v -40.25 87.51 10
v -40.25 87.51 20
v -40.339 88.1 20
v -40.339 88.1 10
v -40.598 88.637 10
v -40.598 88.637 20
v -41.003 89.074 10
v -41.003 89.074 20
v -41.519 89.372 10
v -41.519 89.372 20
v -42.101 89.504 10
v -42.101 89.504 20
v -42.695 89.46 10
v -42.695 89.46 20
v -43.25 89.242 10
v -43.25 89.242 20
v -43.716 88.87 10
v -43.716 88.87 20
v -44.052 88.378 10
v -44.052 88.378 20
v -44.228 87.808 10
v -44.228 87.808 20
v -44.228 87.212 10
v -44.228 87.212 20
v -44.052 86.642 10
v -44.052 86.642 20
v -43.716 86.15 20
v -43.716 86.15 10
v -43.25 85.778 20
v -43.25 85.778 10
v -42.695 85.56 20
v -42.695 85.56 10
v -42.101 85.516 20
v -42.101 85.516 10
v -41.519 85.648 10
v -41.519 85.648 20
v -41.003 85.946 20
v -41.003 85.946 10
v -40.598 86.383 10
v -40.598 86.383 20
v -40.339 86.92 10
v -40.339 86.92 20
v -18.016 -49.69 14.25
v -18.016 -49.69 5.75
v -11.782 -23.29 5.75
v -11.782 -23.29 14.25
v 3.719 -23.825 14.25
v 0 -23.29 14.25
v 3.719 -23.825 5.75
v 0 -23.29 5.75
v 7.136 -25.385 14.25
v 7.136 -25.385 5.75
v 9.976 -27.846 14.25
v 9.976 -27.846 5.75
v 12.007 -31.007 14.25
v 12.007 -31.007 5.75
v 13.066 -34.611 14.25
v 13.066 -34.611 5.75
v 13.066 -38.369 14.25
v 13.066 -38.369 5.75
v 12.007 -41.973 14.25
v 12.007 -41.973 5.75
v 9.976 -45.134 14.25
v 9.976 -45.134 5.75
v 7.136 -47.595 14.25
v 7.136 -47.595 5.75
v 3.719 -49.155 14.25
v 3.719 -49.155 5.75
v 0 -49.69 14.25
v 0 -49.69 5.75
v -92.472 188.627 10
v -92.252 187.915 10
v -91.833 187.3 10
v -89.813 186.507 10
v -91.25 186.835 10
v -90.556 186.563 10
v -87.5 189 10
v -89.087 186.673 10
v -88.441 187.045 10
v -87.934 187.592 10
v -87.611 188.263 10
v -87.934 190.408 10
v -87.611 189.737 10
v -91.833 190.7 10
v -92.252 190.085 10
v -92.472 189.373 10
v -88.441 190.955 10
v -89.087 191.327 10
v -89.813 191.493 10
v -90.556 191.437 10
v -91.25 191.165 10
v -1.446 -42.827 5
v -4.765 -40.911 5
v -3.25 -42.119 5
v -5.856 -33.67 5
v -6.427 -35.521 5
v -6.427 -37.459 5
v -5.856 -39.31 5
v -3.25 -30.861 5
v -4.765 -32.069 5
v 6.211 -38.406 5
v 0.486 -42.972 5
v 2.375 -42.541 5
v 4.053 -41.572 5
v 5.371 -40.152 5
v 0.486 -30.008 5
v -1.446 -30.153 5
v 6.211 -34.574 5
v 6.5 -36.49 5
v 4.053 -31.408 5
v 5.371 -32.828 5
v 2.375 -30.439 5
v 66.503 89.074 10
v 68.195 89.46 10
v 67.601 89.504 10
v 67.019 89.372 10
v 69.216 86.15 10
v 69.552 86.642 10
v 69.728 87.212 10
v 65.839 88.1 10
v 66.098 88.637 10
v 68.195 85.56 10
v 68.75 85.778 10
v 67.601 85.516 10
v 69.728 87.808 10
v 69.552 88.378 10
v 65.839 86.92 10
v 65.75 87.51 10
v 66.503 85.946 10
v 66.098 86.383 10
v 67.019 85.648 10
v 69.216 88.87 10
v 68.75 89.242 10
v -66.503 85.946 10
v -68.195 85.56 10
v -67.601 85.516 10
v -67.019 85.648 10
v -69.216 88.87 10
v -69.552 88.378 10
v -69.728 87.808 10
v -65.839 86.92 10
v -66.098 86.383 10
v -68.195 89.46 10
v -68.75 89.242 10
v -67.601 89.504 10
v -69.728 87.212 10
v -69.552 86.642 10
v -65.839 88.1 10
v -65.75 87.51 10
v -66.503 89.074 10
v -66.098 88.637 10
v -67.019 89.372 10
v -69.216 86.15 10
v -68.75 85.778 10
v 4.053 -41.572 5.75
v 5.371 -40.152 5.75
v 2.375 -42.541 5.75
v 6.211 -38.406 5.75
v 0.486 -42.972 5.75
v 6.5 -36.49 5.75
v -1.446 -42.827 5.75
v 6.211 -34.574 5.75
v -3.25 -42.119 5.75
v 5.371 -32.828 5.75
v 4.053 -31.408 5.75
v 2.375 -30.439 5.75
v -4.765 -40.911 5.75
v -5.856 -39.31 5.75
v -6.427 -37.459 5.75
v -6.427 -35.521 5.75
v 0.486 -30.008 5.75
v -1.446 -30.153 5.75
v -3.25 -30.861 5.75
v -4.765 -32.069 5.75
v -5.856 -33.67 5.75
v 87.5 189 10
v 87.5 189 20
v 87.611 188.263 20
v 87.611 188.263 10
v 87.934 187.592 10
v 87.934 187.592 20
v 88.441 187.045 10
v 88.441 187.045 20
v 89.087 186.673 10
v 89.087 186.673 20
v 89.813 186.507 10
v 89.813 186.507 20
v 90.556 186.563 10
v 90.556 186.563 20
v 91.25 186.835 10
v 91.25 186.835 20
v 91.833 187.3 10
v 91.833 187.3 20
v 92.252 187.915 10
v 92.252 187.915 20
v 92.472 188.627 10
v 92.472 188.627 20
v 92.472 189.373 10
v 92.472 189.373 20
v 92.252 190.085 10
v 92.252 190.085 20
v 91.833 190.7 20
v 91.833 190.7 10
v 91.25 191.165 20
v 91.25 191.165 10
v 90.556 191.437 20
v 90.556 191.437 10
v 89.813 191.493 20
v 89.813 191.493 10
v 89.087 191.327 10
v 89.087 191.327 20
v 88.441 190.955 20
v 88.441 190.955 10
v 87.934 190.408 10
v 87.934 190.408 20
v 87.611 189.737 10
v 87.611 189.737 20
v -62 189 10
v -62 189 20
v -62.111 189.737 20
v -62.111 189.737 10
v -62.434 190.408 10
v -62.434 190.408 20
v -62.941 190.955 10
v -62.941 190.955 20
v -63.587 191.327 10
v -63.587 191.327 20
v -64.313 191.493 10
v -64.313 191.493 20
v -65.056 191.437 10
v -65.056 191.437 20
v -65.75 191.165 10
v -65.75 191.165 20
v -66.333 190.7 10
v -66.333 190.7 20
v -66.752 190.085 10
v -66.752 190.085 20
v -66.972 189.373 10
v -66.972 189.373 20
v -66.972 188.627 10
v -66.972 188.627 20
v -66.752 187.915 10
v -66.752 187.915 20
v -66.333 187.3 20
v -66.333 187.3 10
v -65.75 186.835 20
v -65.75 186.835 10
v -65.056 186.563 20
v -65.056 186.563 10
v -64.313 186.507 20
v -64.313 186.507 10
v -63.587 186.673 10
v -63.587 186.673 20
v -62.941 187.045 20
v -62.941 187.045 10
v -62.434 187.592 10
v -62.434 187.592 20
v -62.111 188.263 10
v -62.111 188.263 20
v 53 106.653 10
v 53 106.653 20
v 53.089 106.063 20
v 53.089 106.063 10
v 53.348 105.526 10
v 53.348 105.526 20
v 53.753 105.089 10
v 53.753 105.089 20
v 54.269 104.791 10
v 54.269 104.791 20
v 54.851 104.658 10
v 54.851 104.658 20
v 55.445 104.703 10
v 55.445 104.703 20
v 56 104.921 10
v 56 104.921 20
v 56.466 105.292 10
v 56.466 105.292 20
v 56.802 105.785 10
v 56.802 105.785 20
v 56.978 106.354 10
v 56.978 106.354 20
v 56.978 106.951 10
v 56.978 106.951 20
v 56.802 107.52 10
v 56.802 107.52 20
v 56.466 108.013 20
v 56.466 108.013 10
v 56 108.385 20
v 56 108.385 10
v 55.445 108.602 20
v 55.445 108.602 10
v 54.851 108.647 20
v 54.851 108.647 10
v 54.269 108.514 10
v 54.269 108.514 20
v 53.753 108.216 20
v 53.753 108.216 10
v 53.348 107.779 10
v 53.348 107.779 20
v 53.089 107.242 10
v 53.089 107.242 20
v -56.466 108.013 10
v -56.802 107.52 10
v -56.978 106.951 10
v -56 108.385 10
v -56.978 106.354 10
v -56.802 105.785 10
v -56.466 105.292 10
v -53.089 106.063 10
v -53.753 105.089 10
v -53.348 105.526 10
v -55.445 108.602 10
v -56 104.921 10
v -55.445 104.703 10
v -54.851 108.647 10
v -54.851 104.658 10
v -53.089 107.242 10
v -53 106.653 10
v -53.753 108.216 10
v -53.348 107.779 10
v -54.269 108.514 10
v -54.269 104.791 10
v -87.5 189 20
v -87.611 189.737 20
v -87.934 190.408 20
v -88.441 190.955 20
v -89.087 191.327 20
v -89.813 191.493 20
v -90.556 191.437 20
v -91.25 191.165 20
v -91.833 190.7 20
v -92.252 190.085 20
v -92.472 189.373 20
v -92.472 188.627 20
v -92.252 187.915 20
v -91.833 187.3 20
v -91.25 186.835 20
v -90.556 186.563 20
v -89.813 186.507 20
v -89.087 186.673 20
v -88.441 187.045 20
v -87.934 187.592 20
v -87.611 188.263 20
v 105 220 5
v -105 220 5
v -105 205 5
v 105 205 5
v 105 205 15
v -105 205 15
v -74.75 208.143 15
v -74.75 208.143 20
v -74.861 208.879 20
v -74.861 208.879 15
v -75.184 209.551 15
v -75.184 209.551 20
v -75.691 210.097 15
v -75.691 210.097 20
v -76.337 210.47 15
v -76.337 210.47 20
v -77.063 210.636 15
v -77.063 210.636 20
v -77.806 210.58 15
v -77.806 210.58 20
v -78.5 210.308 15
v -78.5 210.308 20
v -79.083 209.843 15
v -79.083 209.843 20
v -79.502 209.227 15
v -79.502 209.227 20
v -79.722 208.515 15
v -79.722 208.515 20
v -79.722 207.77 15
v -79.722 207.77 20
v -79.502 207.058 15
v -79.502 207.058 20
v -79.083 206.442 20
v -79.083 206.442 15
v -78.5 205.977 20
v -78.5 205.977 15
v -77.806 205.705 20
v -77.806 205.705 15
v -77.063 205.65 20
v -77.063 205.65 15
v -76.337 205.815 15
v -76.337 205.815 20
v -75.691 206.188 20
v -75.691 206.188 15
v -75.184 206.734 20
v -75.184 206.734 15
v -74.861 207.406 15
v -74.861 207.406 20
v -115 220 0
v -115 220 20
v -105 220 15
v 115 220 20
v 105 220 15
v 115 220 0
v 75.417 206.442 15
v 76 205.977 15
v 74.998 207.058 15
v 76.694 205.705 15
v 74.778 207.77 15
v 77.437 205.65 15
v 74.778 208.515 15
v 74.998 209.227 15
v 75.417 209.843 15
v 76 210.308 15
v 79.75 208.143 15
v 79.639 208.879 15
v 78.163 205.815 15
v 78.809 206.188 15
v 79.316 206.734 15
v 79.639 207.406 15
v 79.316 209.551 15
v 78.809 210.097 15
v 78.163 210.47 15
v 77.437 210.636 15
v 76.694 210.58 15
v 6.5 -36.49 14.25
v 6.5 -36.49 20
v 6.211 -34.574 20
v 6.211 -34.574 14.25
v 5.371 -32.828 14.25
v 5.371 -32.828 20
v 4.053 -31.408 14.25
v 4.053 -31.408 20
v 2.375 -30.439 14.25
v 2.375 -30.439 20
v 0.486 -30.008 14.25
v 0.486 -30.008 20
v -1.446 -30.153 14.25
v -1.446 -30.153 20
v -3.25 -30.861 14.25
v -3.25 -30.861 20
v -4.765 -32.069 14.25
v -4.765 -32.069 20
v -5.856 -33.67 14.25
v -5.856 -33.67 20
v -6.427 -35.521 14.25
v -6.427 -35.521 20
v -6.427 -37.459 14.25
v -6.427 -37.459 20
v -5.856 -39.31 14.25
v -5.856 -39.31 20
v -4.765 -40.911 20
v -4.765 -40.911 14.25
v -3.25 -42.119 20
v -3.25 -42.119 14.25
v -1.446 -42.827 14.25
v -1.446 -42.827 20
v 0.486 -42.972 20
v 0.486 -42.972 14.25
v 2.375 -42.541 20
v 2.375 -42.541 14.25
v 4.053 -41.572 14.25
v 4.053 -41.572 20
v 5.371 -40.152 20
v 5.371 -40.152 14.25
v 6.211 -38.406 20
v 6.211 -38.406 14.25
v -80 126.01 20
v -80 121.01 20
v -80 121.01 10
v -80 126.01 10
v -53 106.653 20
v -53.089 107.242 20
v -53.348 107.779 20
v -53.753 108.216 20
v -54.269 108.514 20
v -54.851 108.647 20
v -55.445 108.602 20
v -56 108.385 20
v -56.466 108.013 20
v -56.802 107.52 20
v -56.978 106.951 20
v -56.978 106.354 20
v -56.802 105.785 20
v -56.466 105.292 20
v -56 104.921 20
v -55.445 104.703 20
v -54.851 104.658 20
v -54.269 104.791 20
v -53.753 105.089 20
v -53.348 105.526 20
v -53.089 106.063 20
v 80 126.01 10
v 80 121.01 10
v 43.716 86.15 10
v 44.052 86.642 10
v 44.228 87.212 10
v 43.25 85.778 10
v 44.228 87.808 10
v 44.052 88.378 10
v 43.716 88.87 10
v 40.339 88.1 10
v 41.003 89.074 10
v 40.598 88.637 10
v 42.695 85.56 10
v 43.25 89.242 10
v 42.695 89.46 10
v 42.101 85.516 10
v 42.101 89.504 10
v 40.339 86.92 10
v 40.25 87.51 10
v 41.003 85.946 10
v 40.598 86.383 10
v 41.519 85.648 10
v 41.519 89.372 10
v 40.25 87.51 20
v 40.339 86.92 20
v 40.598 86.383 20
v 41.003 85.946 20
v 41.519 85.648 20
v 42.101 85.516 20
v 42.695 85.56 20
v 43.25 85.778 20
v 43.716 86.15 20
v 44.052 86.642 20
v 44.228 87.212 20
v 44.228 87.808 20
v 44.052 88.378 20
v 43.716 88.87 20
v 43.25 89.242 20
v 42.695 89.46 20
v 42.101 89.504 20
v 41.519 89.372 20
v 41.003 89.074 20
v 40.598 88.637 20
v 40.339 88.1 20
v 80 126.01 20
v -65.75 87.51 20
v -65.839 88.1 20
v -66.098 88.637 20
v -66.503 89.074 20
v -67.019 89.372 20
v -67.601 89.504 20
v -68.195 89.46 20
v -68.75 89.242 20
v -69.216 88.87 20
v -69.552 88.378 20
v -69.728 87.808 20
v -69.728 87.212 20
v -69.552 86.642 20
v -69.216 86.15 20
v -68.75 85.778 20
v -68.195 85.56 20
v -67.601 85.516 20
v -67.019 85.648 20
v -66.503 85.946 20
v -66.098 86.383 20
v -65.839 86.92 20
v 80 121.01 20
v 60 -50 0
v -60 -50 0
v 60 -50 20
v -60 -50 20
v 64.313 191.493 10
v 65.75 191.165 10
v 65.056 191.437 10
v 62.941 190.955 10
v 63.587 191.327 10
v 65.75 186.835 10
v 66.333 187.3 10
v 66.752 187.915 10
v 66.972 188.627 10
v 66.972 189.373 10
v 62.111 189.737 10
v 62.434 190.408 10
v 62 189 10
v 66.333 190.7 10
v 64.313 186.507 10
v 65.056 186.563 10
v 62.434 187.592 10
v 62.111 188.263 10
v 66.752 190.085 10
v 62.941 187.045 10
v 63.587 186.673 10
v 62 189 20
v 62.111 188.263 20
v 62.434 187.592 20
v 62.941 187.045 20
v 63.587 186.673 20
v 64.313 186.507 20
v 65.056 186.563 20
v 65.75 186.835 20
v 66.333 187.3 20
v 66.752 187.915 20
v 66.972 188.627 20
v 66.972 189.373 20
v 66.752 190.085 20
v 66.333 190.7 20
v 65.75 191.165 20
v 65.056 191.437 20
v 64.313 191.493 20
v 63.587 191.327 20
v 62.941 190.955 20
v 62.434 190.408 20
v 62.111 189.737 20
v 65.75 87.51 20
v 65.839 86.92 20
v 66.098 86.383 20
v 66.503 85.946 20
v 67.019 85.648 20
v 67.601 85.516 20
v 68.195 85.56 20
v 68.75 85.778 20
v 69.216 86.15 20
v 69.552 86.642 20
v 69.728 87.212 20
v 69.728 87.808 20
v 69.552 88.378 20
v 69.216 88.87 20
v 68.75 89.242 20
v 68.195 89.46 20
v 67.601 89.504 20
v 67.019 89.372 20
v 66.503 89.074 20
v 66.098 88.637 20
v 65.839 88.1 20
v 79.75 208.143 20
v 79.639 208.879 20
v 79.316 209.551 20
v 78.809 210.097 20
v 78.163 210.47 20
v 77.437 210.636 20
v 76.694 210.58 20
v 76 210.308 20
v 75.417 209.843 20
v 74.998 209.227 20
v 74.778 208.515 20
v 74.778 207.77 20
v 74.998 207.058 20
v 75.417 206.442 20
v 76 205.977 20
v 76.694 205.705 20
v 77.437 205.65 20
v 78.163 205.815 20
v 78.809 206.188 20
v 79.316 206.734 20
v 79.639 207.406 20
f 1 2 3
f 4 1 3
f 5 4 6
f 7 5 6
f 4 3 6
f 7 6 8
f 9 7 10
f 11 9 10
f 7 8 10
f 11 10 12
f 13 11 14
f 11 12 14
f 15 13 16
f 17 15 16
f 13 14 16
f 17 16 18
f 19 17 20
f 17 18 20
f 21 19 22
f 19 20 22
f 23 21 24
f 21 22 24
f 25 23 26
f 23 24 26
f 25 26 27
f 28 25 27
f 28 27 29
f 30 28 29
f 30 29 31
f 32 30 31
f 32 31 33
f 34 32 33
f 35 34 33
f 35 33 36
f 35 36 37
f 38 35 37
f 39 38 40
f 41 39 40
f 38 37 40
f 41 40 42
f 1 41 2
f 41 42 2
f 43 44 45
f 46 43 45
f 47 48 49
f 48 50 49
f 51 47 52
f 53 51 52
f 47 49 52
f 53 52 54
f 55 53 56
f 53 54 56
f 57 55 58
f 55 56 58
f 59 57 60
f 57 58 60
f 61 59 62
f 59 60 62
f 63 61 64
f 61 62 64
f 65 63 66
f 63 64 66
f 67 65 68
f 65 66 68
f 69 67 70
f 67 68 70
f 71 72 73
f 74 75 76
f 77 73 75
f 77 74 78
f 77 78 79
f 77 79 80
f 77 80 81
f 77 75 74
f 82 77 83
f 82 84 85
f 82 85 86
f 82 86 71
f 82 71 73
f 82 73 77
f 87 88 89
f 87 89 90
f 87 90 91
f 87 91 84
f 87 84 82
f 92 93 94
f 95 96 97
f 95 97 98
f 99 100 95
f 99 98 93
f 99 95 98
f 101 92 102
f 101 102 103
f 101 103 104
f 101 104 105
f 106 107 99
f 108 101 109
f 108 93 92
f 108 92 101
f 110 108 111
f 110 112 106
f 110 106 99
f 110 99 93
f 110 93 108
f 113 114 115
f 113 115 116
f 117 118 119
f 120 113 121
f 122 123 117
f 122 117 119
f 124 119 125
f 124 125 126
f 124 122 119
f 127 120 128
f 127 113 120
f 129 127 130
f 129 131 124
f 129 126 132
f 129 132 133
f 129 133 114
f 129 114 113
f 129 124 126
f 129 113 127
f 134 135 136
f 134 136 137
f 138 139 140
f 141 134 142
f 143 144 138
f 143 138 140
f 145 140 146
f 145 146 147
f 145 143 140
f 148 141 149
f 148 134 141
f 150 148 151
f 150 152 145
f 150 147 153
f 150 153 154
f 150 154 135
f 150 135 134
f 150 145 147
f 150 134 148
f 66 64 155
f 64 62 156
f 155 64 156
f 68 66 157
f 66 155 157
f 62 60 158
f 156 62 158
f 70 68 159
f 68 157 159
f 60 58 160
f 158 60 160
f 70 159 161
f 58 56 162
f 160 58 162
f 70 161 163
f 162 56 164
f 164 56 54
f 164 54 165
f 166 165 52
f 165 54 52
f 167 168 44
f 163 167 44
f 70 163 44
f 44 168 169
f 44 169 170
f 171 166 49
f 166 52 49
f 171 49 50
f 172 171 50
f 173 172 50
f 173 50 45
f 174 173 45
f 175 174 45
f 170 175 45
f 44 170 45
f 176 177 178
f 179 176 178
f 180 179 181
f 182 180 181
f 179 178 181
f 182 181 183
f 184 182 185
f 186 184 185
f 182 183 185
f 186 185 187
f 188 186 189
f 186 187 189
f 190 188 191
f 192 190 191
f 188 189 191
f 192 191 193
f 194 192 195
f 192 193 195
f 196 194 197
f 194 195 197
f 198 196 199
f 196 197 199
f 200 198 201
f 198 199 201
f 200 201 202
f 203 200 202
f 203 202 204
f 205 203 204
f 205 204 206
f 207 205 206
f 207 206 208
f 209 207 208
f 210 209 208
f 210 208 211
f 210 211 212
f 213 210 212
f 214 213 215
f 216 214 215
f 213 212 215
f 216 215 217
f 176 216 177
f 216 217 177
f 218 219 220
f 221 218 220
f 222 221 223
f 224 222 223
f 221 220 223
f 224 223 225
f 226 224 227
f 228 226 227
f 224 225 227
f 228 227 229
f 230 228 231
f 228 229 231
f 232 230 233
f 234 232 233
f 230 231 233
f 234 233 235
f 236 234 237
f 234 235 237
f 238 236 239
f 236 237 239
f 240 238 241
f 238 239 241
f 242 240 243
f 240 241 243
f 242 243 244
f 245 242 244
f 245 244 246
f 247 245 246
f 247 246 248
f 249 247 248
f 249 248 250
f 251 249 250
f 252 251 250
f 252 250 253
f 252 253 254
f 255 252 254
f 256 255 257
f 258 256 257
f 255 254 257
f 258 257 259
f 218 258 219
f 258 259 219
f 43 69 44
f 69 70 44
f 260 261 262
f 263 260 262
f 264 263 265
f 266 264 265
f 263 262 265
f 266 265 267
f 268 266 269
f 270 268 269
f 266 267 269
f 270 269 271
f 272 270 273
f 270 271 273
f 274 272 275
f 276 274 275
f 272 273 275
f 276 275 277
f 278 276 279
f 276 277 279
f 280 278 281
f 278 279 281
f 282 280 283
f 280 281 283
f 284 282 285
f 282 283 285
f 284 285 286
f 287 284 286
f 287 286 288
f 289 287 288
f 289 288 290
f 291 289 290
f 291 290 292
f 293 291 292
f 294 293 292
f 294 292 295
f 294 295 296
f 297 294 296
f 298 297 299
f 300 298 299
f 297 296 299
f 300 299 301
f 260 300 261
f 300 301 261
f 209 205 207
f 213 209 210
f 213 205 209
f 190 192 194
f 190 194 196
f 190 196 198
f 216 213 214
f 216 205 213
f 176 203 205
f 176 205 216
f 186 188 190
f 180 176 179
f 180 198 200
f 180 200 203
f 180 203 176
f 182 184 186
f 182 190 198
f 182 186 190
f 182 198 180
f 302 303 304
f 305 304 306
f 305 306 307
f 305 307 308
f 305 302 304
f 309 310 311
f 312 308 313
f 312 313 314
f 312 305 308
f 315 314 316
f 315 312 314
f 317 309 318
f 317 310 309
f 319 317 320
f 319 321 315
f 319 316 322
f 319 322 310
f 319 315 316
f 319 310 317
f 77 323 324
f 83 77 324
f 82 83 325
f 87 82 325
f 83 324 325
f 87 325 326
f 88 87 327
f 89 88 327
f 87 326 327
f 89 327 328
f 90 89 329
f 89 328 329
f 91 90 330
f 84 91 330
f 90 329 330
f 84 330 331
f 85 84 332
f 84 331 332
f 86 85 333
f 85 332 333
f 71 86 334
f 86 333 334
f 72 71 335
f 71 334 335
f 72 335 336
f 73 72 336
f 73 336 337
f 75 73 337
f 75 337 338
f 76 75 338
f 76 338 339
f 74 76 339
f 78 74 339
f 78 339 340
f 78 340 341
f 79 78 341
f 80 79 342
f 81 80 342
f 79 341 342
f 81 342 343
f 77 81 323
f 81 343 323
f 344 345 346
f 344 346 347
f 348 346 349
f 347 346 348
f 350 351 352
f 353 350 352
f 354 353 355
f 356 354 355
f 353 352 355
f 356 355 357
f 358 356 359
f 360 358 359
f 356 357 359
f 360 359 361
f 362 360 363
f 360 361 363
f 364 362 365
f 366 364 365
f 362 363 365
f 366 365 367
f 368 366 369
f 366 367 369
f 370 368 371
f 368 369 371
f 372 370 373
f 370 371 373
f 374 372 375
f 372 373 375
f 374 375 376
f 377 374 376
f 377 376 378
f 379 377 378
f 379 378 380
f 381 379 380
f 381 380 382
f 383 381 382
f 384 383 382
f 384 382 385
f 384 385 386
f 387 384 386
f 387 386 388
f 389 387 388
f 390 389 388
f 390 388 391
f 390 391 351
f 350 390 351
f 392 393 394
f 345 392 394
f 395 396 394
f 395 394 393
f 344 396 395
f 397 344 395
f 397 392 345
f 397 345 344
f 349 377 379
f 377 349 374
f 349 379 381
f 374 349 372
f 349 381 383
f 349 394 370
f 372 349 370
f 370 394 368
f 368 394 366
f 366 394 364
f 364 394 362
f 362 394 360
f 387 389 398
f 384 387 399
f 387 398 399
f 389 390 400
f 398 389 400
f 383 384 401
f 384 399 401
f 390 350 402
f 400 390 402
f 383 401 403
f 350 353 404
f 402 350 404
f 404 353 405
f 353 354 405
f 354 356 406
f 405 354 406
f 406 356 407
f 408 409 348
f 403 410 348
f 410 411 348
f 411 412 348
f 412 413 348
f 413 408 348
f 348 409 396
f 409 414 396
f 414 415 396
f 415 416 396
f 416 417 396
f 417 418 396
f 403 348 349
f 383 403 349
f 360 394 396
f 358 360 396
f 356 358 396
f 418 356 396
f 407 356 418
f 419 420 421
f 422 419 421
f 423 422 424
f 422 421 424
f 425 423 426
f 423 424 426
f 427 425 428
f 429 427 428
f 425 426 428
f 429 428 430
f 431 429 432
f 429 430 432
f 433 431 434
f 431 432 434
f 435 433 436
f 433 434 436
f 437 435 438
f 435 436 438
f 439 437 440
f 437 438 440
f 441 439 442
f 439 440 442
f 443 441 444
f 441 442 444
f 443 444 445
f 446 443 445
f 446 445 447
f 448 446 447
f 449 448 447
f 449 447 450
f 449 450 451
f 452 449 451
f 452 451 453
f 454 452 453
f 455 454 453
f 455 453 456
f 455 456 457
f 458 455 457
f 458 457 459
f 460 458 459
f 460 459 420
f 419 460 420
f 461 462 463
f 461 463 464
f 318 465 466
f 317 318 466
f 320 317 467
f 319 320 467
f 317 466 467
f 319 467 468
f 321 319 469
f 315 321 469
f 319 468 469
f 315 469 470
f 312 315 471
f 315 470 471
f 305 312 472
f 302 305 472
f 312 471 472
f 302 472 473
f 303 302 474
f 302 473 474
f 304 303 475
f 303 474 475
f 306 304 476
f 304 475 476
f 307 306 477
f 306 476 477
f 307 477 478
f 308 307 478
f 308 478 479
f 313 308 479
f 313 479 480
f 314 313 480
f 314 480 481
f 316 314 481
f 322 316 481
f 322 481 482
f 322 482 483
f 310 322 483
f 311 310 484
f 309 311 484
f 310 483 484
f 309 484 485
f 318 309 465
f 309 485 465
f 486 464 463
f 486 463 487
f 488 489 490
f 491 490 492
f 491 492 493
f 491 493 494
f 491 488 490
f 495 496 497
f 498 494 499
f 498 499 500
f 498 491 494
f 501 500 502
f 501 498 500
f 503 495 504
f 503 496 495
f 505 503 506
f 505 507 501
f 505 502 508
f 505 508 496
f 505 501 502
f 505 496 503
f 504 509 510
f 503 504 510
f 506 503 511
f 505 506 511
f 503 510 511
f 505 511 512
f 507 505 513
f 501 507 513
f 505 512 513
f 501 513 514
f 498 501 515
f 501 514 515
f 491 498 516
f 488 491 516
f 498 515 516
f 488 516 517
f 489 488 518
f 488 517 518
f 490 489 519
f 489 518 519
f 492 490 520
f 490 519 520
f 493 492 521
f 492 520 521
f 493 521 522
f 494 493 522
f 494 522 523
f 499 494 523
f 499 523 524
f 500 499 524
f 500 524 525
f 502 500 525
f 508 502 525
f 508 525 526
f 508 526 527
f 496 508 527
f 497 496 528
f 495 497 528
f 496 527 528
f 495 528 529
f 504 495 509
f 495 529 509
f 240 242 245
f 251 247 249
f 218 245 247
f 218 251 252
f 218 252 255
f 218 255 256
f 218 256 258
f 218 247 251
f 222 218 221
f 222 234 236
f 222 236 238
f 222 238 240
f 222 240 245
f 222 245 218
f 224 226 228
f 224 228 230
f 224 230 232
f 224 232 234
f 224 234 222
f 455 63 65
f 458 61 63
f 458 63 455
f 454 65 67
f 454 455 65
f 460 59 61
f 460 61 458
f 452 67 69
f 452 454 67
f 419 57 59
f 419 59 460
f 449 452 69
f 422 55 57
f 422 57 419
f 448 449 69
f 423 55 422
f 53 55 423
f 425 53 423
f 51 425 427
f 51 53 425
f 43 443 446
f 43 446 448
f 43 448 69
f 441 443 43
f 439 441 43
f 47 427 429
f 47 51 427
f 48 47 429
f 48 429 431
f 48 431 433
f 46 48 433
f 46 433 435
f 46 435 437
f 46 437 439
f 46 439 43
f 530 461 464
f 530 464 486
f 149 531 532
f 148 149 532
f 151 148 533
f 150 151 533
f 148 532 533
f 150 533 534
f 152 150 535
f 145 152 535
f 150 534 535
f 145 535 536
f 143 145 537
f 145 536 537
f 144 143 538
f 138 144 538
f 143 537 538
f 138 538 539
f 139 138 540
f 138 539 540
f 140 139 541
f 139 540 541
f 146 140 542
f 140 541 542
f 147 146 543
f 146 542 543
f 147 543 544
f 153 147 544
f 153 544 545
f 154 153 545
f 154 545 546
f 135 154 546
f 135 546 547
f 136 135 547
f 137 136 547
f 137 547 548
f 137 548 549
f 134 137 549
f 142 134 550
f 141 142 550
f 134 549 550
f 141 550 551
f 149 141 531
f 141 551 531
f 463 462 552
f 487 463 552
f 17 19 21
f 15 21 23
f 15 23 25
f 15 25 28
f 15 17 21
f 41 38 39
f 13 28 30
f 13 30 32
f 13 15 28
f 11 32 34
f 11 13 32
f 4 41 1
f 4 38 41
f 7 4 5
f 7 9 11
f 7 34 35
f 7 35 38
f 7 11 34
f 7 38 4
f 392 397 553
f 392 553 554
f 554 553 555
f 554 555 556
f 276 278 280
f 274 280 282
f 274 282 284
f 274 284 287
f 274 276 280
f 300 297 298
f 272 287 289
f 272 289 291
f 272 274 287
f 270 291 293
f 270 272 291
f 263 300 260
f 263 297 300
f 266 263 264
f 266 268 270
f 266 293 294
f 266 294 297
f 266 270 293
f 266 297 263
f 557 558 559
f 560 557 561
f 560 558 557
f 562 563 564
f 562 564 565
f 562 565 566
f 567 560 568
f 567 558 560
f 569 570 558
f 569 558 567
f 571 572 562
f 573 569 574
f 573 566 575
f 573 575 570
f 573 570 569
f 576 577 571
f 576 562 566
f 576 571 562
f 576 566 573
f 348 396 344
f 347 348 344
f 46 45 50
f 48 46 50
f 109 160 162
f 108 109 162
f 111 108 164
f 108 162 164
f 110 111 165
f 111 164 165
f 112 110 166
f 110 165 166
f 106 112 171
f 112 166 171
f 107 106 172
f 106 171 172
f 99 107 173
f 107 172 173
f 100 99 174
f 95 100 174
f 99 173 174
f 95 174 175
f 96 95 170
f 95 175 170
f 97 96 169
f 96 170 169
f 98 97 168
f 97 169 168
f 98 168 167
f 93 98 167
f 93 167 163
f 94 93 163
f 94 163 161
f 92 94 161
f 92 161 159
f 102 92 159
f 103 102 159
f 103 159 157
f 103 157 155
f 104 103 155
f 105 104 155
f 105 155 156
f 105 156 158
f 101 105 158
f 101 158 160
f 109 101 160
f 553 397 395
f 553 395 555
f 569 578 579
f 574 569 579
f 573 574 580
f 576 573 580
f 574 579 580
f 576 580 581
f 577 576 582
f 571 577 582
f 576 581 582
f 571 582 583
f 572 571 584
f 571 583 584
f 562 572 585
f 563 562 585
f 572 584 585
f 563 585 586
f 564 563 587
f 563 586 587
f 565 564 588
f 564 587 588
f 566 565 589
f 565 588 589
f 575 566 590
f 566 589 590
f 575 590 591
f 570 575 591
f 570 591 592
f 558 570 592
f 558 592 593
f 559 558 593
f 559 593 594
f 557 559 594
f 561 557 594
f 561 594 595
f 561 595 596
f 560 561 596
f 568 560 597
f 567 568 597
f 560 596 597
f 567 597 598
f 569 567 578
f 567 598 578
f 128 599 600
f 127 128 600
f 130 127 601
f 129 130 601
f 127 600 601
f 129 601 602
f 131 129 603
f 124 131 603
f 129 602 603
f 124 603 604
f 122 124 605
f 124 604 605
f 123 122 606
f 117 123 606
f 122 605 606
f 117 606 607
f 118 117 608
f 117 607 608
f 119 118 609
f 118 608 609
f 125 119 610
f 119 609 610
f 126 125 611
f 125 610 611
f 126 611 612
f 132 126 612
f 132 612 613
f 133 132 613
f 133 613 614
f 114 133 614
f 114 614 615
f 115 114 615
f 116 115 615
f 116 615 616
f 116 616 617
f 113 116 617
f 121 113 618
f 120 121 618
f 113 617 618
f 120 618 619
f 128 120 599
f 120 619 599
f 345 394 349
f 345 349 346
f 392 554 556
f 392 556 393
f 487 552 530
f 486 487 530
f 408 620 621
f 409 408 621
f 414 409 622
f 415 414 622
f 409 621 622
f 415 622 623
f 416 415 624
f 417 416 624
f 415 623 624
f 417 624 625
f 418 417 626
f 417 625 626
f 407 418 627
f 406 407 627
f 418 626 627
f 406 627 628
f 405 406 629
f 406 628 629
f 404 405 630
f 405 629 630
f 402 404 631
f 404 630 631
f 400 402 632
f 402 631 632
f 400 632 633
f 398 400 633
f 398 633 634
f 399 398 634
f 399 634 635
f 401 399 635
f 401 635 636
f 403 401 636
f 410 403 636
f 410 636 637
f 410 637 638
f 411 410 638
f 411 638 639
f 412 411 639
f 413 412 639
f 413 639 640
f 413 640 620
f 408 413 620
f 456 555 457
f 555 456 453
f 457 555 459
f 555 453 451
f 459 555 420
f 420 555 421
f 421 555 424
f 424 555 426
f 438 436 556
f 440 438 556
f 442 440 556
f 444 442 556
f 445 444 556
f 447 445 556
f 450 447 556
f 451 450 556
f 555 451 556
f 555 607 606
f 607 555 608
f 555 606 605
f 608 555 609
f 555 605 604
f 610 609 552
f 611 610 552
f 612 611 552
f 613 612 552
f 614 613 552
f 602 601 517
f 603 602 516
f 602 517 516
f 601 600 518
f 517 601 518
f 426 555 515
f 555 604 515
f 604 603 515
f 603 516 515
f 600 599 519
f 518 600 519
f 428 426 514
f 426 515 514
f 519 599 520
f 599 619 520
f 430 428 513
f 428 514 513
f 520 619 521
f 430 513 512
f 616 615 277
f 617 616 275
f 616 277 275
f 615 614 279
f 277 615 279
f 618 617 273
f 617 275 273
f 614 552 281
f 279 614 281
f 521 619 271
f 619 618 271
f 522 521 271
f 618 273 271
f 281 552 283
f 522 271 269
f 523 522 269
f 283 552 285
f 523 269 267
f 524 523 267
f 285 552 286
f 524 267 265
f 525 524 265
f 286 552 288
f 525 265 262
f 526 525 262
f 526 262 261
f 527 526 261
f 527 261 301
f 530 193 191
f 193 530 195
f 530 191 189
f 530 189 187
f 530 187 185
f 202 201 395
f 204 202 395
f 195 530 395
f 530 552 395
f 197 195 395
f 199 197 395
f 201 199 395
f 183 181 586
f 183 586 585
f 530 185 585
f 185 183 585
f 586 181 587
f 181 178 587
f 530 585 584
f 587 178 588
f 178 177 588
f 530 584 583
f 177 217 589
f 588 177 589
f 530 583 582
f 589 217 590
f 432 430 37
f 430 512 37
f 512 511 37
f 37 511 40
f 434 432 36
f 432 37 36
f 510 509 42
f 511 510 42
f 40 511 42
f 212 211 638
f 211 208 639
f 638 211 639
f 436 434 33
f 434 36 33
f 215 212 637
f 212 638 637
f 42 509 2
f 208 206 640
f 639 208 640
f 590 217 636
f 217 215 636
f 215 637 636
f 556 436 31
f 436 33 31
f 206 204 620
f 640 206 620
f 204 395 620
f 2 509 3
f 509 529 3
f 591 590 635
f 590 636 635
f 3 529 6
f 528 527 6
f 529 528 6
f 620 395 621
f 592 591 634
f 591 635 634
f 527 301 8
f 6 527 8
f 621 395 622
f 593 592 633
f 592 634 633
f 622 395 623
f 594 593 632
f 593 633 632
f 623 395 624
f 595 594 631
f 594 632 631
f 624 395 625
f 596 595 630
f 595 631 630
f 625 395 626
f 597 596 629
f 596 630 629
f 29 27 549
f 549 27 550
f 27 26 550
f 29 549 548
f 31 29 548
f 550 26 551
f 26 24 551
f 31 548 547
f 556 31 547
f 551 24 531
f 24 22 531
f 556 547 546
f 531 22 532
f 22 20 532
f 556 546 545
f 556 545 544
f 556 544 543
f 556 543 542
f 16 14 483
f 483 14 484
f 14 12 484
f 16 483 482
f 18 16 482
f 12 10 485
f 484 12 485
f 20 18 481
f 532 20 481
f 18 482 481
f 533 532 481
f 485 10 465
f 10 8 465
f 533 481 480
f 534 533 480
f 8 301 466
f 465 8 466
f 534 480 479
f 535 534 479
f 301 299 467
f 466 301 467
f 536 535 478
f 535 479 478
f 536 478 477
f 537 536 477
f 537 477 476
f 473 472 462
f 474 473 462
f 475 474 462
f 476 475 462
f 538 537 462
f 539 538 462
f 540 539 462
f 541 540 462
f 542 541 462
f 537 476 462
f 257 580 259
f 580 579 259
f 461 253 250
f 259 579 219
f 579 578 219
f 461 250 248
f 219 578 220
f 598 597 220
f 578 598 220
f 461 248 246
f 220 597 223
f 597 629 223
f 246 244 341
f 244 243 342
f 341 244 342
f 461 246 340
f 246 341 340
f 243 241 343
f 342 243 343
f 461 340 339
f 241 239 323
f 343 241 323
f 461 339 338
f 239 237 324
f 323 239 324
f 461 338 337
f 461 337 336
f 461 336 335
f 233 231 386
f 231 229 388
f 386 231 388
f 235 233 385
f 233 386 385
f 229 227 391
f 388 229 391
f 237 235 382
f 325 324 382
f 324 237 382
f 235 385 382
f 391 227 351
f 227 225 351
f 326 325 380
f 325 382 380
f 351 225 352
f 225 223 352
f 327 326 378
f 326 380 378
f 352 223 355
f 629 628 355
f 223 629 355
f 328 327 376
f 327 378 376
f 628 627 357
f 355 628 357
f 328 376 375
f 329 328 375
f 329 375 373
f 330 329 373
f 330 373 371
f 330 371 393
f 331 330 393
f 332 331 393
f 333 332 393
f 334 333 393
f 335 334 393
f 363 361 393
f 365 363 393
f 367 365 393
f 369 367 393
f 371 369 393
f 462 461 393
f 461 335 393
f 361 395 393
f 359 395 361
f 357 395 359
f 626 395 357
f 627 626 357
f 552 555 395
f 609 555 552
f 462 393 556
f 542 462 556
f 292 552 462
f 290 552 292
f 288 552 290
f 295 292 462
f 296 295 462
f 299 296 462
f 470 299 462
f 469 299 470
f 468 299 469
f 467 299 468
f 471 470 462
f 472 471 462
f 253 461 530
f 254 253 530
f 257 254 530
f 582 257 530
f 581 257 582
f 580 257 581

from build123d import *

# Parameters (mm, degrees)
EXTRUDE_1_DEPTH     = 20
SKETCH_3_W          = 210
SKETCH_3_H          = 10
CUT_EXTRUDE_1_DEPTH = 15
SKETCH_4_W          = 160
SKETCH_4_H          = 5
CUT_EXTRUDE_2_DEPTH = 10
SKETCH_5_R          = 2.5
SKETCH_5_R_2        = 2
CUT_EXTRUDE_3_DEPTH = 10
CUT_EXTRUDE_4_DEPTH = 4.25
SKETCH_8_R          = 6.5
CUT_EXTRUDE_6_DEPTH = 15


with BuildPart() as part:
    # 草图1 → 凸台-拉伸1 (new body)
    with BuildSketch(Plane.XY):
        Polygon((-115, 220), (115, 220), (60, -50), (-60, -50), align=None)
    extrude(amount=EXTRUDE_1_DEPTH)

    # 草图3 → 切除-拉伸1 (cut)
    with BuildSketch(Plane(origin=(0, 220, 0), x_dir=(1, 0, 0), z_dir=(0, 1, 0))):
        with Locations((0, -10)):
            Rectangle(SKETCH_3_W, SKETCH_3_H)
    extrude(amount=-CUT_EXTRUDE_1_DEPTH, mode=Mode.SUBTRACT)

    # 草图4 → 切除-拉伸2 (cut)
    with BuildSketch(Plane.XY.offset(20)):
        with Locations((0, 123.51)):
            Rectangle(SKETCH_4_W, SKETCH_4_H)
    extrude(amount=-CUT_EXTRUDE_2_DEPTH, mode=Mode.SUBTRACT)

    # 草图5 → 切除-拉伸3 (cut)
    with BuildSketch(Plane.XY.offset(20)):
        with Locations((-77.25, 208.1425573)):
            Circle(SKETCH_5_R)
        with Locations((-90, 189)):
            Circle(SKETCH_5_R)
        with Locations((-64.5, 189)):
            Circle(SKETCH_5_R)
        with Locations((-55, 106.6525573)):
            Circle(SKETCH_5_R_2)
        with Locations((-67.75, 87.51)):
            Circle(SKETCH_5_R_2)
        with Locations((-42.25, 87.51)):
            Circle(SKETCH_5_R_2)
        with Locations(Location((42.25, 87.51, 0), (0, 0, 180))):
            Circle(SKETCH_5_R_2)
        with Locations(Location((67.75, 87.51, 0), (0, 0, 180))):
            Circle(SKETCH_5_R_2)
        with Locations(Location((55, 106.6525573, 0), (0, 0, 180))):
            Circle(SKETCH_5_R_2)
        with Locations(Location((64.5, 189, 0), (0, 0, 180))):
            Circle(SKETCH_5_R)
        with Locations(Location((90, 189, 0), (0, 0, 180))):
            Circle(SKETCH_5_R)
        with Locations((77.25, 208.1425573)):
            Circle(SKETCH_5_R)
    extrude(amount=-CUT_EXTRUDE_3_DEPTH, mode=Mode.SUBTRACT)

    # 草图6 → 切除-拉伸4 (cut, symmetric)
    with BuildSketch(Plane(origin=(0, 0, 10), x_dir=(-1, 0, 0), z_dir=(0, 0, -1))):
        with BuildLine():
            Line((0, -49.69), (18.016092171, -49.69))
            Line((18.016092171, -49.69), (11.781592332, -23.29))
            Line((11.781592332, -23.29), (0, -23.29))
            ThreePointArc((0, -23.29), (-13.2, -36.49), (0, -49.69))
        make_face()
    extrude(amount=CUT_EXTRUDE_4_DEPTH, both=True, mode=Mode.SUBTRACT)

    # 草图8 → 切除-拉伸6 (cut)
    with BuildSketch(Plane.XY.offset(20)):
        with Locations((0, -36.49)):
            Circle(SKETCH_8_R)
    extrude(amount=-CUT_EXTRUDE_6_DEPTH, mode=Mode.SUBTRACT)


solid = part.part
